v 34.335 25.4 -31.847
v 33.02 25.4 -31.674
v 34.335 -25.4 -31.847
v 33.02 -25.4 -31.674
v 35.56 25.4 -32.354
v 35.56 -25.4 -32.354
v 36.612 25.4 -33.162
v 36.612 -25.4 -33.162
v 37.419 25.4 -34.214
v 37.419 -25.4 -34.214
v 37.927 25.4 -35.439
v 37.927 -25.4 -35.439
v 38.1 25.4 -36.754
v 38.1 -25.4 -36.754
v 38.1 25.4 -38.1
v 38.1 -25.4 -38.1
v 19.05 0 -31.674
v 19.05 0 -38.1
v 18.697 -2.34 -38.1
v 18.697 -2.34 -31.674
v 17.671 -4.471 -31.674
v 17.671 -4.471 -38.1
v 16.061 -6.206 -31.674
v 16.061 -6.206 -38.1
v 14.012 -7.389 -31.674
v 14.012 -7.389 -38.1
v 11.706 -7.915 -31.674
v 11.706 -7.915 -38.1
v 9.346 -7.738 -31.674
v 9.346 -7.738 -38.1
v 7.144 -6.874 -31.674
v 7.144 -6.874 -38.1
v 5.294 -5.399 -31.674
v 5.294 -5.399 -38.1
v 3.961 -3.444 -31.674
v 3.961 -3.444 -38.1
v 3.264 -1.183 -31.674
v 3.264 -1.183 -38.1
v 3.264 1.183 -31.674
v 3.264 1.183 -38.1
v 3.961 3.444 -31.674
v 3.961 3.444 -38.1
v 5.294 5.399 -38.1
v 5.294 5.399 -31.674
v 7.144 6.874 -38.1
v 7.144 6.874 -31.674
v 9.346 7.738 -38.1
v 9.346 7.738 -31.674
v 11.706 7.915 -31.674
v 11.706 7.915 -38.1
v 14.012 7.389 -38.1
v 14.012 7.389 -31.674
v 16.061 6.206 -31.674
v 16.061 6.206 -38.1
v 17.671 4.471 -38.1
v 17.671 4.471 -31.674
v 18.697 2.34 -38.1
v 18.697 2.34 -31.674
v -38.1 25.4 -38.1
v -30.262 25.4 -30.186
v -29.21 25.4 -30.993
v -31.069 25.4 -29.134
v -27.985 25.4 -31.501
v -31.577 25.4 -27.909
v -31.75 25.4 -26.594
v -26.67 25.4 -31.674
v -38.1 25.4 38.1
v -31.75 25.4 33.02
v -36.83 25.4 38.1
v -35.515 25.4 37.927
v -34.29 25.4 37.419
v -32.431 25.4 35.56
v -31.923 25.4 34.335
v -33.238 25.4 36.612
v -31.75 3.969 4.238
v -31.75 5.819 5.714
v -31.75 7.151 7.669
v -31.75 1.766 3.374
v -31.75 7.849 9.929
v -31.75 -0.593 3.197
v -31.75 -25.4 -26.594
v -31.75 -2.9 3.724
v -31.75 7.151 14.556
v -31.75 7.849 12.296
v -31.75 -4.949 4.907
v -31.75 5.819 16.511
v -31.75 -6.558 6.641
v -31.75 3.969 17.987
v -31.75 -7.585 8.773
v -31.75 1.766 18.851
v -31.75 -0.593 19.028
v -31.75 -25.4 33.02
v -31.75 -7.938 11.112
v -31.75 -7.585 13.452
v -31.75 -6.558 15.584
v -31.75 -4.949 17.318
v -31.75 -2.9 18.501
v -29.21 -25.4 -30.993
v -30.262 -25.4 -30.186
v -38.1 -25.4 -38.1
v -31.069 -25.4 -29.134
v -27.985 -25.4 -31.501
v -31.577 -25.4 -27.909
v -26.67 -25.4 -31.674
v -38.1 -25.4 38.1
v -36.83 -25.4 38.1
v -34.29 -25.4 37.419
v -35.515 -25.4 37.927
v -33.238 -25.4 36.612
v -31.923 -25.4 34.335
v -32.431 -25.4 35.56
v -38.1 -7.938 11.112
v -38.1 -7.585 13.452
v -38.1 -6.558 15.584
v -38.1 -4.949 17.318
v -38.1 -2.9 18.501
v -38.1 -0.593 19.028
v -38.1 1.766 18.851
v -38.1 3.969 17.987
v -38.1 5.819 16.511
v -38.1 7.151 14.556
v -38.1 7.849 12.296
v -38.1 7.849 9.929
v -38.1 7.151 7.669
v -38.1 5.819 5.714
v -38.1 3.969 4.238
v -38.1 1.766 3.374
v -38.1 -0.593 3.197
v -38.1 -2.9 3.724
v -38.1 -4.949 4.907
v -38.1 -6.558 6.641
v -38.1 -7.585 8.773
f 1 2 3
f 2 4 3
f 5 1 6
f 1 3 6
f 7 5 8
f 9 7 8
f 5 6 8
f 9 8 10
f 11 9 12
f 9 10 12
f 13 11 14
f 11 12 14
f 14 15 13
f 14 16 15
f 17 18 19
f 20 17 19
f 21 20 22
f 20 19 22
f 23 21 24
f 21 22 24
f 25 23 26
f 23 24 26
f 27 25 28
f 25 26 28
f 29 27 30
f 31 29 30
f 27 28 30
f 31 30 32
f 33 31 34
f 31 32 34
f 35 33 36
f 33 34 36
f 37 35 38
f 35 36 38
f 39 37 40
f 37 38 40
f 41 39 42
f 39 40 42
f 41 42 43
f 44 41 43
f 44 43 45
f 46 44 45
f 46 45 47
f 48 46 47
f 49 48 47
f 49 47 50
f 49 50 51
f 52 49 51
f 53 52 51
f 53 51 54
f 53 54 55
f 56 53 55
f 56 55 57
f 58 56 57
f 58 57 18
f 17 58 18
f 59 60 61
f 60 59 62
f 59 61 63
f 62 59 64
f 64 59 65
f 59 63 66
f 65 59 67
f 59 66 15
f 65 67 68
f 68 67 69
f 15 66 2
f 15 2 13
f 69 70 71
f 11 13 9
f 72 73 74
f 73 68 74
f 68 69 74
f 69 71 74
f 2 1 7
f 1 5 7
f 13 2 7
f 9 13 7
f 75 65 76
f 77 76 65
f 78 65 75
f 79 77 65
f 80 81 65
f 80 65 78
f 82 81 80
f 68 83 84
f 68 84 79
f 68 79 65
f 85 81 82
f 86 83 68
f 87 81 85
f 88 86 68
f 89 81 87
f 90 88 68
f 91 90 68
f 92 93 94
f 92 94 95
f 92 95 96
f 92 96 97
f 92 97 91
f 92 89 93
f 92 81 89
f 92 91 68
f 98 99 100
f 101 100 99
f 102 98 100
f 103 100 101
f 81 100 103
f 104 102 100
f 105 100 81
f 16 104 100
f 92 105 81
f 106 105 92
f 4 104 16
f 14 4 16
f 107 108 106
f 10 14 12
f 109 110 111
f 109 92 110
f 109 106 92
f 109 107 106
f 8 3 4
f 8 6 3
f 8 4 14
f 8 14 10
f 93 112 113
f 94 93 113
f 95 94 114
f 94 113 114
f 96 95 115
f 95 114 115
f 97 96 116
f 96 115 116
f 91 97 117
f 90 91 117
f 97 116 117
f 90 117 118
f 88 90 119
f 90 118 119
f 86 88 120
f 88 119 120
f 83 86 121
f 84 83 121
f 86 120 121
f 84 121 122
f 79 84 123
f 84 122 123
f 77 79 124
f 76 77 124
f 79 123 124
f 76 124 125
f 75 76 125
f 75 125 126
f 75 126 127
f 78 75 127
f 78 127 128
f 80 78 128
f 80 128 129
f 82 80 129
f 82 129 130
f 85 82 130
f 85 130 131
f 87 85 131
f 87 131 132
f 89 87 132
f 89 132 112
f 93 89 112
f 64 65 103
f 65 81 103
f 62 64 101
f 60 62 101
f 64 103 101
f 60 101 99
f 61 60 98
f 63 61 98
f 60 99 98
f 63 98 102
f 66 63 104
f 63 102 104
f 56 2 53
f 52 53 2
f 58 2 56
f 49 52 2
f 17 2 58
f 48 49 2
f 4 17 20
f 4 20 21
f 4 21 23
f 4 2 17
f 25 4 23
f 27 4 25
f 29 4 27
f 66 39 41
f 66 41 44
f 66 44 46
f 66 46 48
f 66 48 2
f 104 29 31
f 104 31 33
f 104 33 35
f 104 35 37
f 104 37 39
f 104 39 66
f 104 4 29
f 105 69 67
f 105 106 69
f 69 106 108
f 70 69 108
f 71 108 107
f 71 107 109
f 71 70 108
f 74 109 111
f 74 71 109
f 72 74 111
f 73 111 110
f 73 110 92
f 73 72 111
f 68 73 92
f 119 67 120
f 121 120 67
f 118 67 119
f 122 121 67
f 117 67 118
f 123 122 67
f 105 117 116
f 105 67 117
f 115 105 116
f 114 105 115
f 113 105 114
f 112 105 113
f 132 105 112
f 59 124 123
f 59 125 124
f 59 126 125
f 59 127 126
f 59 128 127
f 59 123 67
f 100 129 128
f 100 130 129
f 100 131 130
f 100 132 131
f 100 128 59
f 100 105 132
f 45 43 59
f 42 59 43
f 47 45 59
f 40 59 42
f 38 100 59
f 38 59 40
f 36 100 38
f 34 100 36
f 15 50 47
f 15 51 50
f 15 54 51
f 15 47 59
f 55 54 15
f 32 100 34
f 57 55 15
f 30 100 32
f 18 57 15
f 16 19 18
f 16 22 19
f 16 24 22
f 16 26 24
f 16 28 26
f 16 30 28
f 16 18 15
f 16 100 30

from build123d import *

# Parameters (mm, degrees)
F1_DEPTH = 25.4
F2_R     = 5.08
F3_R     = 7.9375
F4_DEPTH = 25.4
F5_R     = 7.9375
F6_DEPTH = 25.4


with BuildPart() as f1:
    # F0 (on Front) → F1 (new body, symmetric)
    with BuildSketch(Plane.XZ):
        Polygon((-38.1, -38.1), (38.1, -38.1), (38.1, -31.6738), (-31.75, -31.6738), (-31.75, 38.1), (-38.1, 38.1), align=None)
    extrude(amount=F1_DEPTH, both=True)

    # F2
    f2_edges = [f1.edges().sort_by_distance(p)[0] for p in [
        (-31.75, 0, 38.1),
        (-31.75, 0, -31.6738),
        (38.1, 0, -31.6738),
    ]]
    fillet(f2_edges, radius=F2_R)

    # F3 (on face) → F4 (cut)
    with BuildSketch(Plane(origin=(-38.1, 0, 0), x_dir=(0, -1, 0), z_dir=(-1, 0, 0))):
        with Locations((0, 11.1125)):
            Circle(F3_R)
    extrude(amount=-F4_DEPTH, mode=Mode.SUBTRACT)

    # F5 (on face) → F6 (cut)
    with BuildSketch(Plane(origin=(0, 0, -38.1), x_dir=(1, 0, 0), z_dir=(0, 0, -1))):
        with Locations((11.1125, 0)):
            Circle(F5_R)
    extrude(amount=-F6_DEPTH, mode=Mode.SUBTRACT)


solid = f1.part
